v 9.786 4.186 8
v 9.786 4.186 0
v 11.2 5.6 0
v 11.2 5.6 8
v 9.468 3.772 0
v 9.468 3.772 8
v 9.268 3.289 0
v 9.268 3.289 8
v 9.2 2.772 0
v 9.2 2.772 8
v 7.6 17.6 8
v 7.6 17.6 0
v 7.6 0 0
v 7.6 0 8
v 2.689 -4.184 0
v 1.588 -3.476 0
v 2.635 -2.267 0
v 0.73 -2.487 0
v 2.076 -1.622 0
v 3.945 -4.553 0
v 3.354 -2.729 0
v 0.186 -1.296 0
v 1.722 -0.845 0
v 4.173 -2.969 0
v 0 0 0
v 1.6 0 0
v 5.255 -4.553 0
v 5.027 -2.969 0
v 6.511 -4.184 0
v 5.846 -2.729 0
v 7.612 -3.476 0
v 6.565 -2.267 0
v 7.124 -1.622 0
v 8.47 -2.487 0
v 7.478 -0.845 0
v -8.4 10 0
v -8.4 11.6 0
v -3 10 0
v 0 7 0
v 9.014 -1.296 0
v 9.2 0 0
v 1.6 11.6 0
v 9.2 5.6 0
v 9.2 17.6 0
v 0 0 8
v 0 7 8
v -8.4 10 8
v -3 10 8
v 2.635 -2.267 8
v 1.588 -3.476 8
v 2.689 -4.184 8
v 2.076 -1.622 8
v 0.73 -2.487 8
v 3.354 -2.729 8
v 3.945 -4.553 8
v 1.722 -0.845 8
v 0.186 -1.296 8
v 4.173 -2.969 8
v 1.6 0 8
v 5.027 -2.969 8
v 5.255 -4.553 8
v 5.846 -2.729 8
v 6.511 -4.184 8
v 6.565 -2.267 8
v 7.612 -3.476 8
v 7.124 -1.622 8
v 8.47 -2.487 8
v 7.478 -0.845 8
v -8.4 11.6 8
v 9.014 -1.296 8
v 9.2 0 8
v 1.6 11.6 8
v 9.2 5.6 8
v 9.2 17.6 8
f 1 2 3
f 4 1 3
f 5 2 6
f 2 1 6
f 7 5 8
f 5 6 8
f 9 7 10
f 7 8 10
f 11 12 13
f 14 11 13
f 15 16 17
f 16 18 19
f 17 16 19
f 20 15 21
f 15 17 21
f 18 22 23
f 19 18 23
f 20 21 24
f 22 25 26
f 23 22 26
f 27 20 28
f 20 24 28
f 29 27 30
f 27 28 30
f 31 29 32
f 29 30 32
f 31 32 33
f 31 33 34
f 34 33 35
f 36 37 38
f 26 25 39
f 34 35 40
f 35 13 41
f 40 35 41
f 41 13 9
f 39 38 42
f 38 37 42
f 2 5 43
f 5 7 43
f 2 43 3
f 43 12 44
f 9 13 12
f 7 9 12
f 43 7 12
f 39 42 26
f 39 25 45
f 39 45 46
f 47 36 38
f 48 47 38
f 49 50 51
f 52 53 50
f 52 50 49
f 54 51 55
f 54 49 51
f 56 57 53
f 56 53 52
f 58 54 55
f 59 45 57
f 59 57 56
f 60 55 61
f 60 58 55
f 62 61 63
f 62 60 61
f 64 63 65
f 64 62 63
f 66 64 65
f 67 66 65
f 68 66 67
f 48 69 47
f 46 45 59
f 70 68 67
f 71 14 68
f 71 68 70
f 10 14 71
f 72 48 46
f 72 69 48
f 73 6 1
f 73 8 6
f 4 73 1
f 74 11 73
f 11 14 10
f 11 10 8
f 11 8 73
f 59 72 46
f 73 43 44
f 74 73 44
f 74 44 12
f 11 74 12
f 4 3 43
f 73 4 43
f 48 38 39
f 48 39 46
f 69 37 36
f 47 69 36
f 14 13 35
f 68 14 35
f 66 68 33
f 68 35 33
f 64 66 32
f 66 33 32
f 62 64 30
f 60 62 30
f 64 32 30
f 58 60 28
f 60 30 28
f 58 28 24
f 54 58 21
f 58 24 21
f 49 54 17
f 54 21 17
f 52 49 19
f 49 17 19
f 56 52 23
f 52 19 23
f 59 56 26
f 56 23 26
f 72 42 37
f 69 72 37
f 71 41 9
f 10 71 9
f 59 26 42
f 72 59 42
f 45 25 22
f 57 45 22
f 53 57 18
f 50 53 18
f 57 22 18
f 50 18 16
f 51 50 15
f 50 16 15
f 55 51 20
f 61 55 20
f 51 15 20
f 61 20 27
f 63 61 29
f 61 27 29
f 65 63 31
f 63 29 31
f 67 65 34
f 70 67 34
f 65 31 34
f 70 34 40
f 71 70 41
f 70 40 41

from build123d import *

# Parameters (mm, degrees)
F0_W     = 1.6
F0_H     = 10
F1_DEPTH = 8
F2_R     = 2
F3_SIZE  = 3


with BuildPart() as f1:
    # F0 (on Top) → F1 (new body)
    with BuildSketch(Plane.XY):
        Polygon((9.2, 5.6), (9.2, 3.6), (11.2, 5.6), align=None)
        Polygon((7.6, 0), (9.2, 0), (9.2, 3.6), (9.2, 5.6), (9.2, 17.6), (7.6, 17.6), align=None)
        with BuildLine():
            Line((1.6, 0), (0, 0))
            ThreePointArc((0, 0), (4.6, -4.6), (9.2, 0))
            Line((9.2, 0), (7.6, 0))
            ThreePointArc((7.6, 0), (4.6, -3), (1.6, 0))
        make_face()
        with Locations((0.8, 5)):
            Rectangle(F0_W, F0_H)
        Polygon((-8.4, 10), (0, 10), (1.6, 10), (1.6, 11.6), (-8.4, 11.6), align=None)
    extrude(amount=F1_DEPTH)

    # F2
    f2_edges = [f1.edges().sort_by_distance(p)[0] for p in [
        (9.2, 3.6, 4),
    ]]
    fillet(f2_edges, radius=F2_R)

    # F3
    f3_edges = [f1.edges().sort_by_distance(p)[0] for p in [
        (0, 10, 4),
    ]]
    chamfer(f3_edges, length=F3_SIZE)


solid = f1.part
